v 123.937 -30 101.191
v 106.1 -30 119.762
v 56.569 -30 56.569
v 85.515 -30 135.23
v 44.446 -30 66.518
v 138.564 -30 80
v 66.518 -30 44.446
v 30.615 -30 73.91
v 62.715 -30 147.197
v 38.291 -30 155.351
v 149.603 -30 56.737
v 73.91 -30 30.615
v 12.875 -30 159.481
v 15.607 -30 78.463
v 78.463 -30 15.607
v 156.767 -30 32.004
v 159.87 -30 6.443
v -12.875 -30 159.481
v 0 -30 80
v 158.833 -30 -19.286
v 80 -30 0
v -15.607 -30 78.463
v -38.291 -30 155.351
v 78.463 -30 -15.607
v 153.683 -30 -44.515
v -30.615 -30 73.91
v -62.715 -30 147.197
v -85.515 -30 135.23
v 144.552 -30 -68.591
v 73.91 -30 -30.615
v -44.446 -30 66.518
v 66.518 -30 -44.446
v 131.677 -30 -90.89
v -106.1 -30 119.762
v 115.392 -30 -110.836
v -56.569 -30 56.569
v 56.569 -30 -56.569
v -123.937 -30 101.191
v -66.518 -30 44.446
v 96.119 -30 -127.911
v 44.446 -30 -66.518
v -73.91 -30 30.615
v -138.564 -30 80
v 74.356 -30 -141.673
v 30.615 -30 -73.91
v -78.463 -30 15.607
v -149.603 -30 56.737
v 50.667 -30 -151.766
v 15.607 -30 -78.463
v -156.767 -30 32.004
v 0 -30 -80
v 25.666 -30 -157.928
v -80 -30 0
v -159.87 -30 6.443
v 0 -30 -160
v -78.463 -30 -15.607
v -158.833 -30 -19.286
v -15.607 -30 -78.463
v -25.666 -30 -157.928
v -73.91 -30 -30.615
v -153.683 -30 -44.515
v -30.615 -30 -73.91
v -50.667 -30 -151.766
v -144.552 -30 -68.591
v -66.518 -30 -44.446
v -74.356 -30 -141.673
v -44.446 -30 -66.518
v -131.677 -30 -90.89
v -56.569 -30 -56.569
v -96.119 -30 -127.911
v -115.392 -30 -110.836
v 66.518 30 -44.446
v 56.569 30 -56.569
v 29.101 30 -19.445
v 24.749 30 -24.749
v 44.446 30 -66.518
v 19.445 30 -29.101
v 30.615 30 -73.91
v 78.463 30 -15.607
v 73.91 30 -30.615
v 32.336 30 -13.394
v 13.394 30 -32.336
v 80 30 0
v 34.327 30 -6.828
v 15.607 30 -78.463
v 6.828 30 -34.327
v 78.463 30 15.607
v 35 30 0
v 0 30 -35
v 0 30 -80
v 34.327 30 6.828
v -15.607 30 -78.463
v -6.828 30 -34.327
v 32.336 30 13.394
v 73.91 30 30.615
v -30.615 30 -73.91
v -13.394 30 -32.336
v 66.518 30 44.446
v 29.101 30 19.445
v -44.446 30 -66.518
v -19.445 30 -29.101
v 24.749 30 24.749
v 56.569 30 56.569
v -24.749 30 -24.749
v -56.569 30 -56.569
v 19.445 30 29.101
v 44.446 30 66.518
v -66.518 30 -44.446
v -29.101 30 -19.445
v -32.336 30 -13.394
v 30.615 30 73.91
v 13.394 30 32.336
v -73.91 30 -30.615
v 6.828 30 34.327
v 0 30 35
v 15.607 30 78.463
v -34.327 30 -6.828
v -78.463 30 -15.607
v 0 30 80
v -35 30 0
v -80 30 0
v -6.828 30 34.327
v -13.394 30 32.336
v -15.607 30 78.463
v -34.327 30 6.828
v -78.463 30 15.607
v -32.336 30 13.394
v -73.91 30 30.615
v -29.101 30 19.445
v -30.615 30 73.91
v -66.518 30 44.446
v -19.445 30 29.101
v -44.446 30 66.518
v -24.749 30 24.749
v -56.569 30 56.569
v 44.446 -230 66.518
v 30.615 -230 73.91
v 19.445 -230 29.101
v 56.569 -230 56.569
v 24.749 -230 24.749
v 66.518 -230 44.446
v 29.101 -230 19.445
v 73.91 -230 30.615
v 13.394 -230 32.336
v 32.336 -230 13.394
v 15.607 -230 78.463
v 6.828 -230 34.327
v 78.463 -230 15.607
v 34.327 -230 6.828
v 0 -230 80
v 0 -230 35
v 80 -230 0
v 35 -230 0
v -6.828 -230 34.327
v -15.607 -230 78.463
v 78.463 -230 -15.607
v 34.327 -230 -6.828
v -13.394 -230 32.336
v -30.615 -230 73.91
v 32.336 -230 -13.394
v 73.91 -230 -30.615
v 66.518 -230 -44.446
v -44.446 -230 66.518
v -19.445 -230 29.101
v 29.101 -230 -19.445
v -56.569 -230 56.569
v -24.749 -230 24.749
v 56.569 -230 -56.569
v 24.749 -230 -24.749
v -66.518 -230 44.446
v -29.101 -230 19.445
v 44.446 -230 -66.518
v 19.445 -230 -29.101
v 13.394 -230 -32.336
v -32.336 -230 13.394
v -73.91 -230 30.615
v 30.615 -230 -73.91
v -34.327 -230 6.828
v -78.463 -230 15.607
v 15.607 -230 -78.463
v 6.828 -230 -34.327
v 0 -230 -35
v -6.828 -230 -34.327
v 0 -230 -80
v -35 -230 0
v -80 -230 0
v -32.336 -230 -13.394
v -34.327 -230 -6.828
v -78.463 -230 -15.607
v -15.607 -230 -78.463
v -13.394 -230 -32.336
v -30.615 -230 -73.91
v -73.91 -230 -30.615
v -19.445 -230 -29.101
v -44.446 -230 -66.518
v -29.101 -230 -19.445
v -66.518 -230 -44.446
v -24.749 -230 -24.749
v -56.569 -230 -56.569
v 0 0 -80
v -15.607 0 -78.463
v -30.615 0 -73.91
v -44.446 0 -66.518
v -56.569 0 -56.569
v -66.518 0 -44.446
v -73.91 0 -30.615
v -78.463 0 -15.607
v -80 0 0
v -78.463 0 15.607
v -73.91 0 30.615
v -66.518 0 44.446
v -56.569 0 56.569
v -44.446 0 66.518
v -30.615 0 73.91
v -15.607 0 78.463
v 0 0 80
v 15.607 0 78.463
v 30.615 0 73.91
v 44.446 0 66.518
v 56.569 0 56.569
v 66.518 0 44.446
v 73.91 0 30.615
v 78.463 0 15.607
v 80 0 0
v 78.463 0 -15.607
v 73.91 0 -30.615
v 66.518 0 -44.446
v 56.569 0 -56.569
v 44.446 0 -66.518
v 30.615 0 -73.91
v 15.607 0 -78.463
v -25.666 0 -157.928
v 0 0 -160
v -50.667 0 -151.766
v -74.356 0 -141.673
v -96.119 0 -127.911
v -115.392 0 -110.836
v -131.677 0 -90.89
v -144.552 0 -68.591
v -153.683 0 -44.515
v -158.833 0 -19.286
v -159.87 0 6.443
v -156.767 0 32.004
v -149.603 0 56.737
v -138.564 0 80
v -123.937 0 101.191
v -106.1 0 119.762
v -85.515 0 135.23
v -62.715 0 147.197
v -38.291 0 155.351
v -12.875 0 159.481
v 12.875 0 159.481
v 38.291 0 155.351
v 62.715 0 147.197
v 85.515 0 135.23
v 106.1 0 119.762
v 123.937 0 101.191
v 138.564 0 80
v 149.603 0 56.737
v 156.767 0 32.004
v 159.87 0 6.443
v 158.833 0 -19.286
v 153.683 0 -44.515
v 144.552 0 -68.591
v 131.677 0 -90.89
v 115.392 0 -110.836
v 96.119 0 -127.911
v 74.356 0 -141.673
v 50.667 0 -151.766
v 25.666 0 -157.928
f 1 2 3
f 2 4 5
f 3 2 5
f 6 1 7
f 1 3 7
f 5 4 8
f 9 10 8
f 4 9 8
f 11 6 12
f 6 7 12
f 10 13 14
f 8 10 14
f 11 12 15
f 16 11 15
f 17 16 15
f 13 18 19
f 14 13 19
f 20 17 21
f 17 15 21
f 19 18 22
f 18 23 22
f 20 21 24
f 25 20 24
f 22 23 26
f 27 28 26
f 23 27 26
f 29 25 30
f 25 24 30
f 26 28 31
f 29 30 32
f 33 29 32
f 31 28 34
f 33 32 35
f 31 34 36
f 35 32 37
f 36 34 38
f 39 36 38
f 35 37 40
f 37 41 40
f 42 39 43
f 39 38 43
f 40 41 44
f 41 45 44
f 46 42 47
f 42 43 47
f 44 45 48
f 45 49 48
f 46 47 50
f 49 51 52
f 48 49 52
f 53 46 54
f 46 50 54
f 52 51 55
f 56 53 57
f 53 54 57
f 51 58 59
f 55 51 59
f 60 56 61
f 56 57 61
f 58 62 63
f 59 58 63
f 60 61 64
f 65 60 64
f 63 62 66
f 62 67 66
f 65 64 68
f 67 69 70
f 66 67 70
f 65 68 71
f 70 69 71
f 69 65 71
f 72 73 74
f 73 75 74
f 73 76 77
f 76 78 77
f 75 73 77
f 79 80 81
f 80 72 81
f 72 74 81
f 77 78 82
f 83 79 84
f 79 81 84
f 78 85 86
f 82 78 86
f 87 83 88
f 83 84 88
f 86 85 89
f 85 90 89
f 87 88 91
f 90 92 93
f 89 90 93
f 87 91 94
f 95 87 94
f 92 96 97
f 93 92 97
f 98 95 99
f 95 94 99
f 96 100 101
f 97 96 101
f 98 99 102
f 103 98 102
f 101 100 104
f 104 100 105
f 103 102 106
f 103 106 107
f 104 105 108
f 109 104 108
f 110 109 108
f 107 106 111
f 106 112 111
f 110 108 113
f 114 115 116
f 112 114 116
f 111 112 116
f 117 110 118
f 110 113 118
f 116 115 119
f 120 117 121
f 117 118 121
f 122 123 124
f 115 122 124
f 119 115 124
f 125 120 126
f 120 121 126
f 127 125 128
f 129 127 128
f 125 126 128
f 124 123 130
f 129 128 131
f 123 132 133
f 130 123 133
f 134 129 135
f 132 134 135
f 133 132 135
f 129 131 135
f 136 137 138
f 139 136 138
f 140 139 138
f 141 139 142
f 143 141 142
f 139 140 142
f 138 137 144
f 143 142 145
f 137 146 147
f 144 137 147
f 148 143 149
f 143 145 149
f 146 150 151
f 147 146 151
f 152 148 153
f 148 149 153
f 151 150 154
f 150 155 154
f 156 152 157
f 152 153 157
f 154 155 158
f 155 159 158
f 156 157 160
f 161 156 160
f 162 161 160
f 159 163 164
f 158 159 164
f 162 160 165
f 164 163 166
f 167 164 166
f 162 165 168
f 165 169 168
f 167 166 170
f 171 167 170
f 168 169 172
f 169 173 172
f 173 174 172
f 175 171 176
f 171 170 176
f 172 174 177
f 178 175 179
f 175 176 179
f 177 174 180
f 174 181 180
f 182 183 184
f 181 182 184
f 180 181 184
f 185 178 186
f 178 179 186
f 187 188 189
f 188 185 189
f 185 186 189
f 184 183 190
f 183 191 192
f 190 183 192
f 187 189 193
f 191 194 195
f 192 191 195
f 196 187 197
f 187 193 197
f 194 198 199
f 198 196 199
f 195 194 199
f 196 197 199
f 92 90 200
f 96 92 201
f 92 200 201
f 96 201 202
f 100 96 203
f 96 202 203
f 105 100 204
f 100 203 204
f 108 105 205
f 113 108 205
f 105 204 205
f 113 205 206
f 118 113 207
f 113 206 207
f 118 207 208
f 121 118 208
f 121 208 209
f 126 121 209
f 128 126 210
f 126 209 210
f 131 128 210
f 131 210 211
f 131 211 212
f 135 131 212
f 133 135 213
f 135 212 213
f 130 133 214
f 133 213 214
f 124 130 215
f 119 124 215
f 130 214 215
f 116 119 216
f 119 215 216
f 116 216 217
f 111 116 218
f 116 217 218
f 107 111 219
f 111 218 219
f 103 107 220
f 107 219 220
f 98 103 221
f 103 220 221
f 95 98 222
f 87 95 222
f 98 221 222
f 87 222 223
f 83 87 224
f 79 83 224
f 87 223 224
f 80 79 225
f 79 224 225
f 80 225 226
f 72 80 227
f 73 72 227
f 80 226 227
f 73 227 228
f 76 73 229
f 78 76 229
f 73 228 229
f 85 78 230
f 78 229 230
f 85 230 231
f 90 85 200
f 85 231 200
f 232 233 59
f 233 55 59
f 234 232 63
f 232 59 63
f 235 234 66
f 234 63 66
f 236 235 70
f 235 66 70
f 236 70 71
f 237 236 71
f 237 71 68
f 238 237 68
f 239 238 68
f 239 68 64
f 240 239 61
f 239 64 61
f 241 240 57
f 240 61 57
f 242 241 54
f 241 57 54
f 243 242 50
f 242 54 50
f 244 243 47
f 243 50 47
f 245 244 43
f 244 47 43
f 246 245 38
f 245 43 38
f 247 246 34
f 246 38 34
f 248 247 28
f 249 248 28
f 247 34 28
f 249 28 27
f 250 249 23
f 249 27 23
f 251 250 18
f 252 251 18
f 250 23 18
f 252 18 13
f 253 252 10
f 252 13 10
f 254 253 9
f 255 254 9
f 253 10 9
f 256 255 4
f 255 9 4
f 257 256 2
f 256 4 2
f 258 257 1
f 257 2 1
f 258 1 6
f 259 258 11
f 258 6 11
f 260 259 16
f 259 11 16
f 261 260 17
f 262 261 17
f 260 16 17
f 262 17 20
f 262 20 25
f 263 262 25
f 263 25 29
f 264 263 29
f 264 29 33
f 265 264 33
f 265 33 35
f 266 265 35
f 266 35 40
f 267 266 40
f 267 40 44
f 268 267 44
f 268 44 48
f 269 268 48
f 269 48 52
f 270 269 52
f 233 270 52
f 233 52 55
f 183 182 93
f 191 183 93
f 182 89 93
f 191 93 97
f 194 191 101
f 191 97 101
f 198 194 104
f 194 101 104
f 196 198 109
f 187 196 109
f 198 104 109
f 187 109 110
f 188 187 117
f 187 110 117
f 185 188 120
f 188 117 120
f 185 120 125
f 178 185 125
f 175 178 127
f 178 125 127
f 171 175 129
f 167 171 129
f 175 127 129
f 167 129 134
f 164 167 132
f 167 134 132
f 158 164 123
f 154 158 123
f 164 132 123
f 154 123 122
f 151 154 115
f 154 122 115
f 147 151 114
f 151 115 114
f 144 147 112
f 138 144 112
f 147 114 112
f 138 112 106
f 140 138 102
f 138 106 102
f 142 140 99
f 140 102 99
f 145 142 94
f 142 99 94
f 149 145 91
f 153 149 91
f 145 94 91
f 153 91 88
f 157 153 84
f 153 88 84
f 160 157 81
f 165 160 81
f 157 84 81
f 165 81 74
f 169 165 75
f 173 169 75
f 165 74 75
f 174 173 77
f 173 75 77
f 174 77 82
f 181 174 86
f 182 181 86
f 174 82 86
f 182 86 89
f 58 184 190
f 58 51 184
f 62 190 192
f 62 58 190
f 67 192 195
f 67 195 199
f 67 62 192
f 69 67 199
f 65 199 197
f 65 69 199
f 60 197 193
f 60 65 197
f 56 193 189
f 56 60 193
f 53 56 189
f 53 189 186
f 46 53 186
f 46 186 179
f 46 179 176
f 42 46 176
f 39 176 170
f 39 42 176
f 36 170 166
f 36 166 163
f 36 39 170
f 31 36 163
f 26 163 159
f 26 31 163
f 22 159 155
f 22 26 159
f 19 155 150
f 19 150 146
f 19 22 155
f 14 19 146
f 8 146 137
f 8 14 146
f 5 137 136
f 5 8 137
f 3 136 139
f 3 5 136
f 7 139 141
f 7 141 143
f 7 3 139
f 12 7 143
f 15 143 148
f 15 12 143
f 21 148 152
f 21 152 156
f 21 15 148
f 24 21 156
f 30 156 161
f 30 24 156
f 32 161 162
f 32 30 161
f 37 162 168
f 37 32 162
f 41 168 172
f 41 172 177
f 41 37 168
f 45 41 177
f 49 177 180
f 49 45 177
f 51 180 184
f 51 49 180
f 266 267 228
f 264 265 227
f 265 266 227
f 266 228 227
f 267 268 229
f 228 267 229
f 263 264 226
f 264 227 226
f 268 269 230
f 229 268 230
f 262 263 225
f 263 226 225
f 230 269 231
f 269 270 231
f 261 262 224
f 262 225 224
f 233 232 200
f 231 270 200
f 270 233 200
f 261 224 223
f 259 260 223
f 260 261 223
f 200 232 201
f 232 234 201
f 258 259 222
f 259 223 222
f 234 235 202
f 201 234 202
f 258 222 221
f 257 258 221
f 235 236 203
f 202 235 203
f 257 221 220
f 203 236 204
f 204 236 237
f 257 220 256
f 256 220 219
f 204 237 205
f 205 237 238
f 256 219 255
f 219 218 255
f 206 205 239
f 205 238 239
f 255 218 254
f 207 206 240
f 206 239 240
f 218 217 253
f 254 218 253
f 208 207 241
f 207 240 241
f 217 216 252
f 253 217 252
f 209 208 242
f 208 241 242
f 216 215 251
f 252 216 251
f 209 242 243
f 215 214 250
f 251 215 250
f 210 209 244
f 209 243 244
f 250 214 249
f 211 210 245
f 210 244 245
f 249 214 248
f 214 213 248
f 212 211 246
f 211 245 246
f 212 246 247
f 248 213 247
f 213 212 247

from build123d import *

# Parameters (mm, degrees)
SKETCH2_W = 80
SKETCH2_H = 200
SKETCH4_W = 35
SKETCH4_H = 304.864877585


with BuildPart() as part:
    # Sketch2 → Revolve3 (revolve)
    with BuildSketch(Plane.XY, mode=Mode.PRIVATE) as revolve3_sk:
        Polygon((-25, 0), (0, 0), (0, 30), (-80, 30), (-80, 0), align=None)
        Polygon((0, -30), (0, 0), (-25, 0), (-80, 0), (-160, 0), (-160, -30), (-80, -30), align=None)
        with Locations((-40, -130)):
            Rectangle(SKETCH2_W, SKETCH2_H)
    revolve(revolve3_sk.sketch.rotate(Axis((0, -55, 0), (0, 1, 0)), 270), axis=Axis((0, -55, 0), (0, 1, 0)))

    # Sketch4 → Cut-Revolve7 (revolve, cut)
    with BuildSketch(Plane.XY, mode=Mode.PRIVATE) as cut_revolve7_sk:
        with Locations((-17.5, -99.023733968)):
            Rectangle(SKETCH4_W, SKETCH4_H)
    revolve(cut_revolve7_sk.sketch.rotate(Axis((0, -55, 0), (0, 1, 0)), 270), axis=Axis((0, -55, 0), (0, 1, 0)), mode=Mode.SUBTRACT)


solid = part.part
